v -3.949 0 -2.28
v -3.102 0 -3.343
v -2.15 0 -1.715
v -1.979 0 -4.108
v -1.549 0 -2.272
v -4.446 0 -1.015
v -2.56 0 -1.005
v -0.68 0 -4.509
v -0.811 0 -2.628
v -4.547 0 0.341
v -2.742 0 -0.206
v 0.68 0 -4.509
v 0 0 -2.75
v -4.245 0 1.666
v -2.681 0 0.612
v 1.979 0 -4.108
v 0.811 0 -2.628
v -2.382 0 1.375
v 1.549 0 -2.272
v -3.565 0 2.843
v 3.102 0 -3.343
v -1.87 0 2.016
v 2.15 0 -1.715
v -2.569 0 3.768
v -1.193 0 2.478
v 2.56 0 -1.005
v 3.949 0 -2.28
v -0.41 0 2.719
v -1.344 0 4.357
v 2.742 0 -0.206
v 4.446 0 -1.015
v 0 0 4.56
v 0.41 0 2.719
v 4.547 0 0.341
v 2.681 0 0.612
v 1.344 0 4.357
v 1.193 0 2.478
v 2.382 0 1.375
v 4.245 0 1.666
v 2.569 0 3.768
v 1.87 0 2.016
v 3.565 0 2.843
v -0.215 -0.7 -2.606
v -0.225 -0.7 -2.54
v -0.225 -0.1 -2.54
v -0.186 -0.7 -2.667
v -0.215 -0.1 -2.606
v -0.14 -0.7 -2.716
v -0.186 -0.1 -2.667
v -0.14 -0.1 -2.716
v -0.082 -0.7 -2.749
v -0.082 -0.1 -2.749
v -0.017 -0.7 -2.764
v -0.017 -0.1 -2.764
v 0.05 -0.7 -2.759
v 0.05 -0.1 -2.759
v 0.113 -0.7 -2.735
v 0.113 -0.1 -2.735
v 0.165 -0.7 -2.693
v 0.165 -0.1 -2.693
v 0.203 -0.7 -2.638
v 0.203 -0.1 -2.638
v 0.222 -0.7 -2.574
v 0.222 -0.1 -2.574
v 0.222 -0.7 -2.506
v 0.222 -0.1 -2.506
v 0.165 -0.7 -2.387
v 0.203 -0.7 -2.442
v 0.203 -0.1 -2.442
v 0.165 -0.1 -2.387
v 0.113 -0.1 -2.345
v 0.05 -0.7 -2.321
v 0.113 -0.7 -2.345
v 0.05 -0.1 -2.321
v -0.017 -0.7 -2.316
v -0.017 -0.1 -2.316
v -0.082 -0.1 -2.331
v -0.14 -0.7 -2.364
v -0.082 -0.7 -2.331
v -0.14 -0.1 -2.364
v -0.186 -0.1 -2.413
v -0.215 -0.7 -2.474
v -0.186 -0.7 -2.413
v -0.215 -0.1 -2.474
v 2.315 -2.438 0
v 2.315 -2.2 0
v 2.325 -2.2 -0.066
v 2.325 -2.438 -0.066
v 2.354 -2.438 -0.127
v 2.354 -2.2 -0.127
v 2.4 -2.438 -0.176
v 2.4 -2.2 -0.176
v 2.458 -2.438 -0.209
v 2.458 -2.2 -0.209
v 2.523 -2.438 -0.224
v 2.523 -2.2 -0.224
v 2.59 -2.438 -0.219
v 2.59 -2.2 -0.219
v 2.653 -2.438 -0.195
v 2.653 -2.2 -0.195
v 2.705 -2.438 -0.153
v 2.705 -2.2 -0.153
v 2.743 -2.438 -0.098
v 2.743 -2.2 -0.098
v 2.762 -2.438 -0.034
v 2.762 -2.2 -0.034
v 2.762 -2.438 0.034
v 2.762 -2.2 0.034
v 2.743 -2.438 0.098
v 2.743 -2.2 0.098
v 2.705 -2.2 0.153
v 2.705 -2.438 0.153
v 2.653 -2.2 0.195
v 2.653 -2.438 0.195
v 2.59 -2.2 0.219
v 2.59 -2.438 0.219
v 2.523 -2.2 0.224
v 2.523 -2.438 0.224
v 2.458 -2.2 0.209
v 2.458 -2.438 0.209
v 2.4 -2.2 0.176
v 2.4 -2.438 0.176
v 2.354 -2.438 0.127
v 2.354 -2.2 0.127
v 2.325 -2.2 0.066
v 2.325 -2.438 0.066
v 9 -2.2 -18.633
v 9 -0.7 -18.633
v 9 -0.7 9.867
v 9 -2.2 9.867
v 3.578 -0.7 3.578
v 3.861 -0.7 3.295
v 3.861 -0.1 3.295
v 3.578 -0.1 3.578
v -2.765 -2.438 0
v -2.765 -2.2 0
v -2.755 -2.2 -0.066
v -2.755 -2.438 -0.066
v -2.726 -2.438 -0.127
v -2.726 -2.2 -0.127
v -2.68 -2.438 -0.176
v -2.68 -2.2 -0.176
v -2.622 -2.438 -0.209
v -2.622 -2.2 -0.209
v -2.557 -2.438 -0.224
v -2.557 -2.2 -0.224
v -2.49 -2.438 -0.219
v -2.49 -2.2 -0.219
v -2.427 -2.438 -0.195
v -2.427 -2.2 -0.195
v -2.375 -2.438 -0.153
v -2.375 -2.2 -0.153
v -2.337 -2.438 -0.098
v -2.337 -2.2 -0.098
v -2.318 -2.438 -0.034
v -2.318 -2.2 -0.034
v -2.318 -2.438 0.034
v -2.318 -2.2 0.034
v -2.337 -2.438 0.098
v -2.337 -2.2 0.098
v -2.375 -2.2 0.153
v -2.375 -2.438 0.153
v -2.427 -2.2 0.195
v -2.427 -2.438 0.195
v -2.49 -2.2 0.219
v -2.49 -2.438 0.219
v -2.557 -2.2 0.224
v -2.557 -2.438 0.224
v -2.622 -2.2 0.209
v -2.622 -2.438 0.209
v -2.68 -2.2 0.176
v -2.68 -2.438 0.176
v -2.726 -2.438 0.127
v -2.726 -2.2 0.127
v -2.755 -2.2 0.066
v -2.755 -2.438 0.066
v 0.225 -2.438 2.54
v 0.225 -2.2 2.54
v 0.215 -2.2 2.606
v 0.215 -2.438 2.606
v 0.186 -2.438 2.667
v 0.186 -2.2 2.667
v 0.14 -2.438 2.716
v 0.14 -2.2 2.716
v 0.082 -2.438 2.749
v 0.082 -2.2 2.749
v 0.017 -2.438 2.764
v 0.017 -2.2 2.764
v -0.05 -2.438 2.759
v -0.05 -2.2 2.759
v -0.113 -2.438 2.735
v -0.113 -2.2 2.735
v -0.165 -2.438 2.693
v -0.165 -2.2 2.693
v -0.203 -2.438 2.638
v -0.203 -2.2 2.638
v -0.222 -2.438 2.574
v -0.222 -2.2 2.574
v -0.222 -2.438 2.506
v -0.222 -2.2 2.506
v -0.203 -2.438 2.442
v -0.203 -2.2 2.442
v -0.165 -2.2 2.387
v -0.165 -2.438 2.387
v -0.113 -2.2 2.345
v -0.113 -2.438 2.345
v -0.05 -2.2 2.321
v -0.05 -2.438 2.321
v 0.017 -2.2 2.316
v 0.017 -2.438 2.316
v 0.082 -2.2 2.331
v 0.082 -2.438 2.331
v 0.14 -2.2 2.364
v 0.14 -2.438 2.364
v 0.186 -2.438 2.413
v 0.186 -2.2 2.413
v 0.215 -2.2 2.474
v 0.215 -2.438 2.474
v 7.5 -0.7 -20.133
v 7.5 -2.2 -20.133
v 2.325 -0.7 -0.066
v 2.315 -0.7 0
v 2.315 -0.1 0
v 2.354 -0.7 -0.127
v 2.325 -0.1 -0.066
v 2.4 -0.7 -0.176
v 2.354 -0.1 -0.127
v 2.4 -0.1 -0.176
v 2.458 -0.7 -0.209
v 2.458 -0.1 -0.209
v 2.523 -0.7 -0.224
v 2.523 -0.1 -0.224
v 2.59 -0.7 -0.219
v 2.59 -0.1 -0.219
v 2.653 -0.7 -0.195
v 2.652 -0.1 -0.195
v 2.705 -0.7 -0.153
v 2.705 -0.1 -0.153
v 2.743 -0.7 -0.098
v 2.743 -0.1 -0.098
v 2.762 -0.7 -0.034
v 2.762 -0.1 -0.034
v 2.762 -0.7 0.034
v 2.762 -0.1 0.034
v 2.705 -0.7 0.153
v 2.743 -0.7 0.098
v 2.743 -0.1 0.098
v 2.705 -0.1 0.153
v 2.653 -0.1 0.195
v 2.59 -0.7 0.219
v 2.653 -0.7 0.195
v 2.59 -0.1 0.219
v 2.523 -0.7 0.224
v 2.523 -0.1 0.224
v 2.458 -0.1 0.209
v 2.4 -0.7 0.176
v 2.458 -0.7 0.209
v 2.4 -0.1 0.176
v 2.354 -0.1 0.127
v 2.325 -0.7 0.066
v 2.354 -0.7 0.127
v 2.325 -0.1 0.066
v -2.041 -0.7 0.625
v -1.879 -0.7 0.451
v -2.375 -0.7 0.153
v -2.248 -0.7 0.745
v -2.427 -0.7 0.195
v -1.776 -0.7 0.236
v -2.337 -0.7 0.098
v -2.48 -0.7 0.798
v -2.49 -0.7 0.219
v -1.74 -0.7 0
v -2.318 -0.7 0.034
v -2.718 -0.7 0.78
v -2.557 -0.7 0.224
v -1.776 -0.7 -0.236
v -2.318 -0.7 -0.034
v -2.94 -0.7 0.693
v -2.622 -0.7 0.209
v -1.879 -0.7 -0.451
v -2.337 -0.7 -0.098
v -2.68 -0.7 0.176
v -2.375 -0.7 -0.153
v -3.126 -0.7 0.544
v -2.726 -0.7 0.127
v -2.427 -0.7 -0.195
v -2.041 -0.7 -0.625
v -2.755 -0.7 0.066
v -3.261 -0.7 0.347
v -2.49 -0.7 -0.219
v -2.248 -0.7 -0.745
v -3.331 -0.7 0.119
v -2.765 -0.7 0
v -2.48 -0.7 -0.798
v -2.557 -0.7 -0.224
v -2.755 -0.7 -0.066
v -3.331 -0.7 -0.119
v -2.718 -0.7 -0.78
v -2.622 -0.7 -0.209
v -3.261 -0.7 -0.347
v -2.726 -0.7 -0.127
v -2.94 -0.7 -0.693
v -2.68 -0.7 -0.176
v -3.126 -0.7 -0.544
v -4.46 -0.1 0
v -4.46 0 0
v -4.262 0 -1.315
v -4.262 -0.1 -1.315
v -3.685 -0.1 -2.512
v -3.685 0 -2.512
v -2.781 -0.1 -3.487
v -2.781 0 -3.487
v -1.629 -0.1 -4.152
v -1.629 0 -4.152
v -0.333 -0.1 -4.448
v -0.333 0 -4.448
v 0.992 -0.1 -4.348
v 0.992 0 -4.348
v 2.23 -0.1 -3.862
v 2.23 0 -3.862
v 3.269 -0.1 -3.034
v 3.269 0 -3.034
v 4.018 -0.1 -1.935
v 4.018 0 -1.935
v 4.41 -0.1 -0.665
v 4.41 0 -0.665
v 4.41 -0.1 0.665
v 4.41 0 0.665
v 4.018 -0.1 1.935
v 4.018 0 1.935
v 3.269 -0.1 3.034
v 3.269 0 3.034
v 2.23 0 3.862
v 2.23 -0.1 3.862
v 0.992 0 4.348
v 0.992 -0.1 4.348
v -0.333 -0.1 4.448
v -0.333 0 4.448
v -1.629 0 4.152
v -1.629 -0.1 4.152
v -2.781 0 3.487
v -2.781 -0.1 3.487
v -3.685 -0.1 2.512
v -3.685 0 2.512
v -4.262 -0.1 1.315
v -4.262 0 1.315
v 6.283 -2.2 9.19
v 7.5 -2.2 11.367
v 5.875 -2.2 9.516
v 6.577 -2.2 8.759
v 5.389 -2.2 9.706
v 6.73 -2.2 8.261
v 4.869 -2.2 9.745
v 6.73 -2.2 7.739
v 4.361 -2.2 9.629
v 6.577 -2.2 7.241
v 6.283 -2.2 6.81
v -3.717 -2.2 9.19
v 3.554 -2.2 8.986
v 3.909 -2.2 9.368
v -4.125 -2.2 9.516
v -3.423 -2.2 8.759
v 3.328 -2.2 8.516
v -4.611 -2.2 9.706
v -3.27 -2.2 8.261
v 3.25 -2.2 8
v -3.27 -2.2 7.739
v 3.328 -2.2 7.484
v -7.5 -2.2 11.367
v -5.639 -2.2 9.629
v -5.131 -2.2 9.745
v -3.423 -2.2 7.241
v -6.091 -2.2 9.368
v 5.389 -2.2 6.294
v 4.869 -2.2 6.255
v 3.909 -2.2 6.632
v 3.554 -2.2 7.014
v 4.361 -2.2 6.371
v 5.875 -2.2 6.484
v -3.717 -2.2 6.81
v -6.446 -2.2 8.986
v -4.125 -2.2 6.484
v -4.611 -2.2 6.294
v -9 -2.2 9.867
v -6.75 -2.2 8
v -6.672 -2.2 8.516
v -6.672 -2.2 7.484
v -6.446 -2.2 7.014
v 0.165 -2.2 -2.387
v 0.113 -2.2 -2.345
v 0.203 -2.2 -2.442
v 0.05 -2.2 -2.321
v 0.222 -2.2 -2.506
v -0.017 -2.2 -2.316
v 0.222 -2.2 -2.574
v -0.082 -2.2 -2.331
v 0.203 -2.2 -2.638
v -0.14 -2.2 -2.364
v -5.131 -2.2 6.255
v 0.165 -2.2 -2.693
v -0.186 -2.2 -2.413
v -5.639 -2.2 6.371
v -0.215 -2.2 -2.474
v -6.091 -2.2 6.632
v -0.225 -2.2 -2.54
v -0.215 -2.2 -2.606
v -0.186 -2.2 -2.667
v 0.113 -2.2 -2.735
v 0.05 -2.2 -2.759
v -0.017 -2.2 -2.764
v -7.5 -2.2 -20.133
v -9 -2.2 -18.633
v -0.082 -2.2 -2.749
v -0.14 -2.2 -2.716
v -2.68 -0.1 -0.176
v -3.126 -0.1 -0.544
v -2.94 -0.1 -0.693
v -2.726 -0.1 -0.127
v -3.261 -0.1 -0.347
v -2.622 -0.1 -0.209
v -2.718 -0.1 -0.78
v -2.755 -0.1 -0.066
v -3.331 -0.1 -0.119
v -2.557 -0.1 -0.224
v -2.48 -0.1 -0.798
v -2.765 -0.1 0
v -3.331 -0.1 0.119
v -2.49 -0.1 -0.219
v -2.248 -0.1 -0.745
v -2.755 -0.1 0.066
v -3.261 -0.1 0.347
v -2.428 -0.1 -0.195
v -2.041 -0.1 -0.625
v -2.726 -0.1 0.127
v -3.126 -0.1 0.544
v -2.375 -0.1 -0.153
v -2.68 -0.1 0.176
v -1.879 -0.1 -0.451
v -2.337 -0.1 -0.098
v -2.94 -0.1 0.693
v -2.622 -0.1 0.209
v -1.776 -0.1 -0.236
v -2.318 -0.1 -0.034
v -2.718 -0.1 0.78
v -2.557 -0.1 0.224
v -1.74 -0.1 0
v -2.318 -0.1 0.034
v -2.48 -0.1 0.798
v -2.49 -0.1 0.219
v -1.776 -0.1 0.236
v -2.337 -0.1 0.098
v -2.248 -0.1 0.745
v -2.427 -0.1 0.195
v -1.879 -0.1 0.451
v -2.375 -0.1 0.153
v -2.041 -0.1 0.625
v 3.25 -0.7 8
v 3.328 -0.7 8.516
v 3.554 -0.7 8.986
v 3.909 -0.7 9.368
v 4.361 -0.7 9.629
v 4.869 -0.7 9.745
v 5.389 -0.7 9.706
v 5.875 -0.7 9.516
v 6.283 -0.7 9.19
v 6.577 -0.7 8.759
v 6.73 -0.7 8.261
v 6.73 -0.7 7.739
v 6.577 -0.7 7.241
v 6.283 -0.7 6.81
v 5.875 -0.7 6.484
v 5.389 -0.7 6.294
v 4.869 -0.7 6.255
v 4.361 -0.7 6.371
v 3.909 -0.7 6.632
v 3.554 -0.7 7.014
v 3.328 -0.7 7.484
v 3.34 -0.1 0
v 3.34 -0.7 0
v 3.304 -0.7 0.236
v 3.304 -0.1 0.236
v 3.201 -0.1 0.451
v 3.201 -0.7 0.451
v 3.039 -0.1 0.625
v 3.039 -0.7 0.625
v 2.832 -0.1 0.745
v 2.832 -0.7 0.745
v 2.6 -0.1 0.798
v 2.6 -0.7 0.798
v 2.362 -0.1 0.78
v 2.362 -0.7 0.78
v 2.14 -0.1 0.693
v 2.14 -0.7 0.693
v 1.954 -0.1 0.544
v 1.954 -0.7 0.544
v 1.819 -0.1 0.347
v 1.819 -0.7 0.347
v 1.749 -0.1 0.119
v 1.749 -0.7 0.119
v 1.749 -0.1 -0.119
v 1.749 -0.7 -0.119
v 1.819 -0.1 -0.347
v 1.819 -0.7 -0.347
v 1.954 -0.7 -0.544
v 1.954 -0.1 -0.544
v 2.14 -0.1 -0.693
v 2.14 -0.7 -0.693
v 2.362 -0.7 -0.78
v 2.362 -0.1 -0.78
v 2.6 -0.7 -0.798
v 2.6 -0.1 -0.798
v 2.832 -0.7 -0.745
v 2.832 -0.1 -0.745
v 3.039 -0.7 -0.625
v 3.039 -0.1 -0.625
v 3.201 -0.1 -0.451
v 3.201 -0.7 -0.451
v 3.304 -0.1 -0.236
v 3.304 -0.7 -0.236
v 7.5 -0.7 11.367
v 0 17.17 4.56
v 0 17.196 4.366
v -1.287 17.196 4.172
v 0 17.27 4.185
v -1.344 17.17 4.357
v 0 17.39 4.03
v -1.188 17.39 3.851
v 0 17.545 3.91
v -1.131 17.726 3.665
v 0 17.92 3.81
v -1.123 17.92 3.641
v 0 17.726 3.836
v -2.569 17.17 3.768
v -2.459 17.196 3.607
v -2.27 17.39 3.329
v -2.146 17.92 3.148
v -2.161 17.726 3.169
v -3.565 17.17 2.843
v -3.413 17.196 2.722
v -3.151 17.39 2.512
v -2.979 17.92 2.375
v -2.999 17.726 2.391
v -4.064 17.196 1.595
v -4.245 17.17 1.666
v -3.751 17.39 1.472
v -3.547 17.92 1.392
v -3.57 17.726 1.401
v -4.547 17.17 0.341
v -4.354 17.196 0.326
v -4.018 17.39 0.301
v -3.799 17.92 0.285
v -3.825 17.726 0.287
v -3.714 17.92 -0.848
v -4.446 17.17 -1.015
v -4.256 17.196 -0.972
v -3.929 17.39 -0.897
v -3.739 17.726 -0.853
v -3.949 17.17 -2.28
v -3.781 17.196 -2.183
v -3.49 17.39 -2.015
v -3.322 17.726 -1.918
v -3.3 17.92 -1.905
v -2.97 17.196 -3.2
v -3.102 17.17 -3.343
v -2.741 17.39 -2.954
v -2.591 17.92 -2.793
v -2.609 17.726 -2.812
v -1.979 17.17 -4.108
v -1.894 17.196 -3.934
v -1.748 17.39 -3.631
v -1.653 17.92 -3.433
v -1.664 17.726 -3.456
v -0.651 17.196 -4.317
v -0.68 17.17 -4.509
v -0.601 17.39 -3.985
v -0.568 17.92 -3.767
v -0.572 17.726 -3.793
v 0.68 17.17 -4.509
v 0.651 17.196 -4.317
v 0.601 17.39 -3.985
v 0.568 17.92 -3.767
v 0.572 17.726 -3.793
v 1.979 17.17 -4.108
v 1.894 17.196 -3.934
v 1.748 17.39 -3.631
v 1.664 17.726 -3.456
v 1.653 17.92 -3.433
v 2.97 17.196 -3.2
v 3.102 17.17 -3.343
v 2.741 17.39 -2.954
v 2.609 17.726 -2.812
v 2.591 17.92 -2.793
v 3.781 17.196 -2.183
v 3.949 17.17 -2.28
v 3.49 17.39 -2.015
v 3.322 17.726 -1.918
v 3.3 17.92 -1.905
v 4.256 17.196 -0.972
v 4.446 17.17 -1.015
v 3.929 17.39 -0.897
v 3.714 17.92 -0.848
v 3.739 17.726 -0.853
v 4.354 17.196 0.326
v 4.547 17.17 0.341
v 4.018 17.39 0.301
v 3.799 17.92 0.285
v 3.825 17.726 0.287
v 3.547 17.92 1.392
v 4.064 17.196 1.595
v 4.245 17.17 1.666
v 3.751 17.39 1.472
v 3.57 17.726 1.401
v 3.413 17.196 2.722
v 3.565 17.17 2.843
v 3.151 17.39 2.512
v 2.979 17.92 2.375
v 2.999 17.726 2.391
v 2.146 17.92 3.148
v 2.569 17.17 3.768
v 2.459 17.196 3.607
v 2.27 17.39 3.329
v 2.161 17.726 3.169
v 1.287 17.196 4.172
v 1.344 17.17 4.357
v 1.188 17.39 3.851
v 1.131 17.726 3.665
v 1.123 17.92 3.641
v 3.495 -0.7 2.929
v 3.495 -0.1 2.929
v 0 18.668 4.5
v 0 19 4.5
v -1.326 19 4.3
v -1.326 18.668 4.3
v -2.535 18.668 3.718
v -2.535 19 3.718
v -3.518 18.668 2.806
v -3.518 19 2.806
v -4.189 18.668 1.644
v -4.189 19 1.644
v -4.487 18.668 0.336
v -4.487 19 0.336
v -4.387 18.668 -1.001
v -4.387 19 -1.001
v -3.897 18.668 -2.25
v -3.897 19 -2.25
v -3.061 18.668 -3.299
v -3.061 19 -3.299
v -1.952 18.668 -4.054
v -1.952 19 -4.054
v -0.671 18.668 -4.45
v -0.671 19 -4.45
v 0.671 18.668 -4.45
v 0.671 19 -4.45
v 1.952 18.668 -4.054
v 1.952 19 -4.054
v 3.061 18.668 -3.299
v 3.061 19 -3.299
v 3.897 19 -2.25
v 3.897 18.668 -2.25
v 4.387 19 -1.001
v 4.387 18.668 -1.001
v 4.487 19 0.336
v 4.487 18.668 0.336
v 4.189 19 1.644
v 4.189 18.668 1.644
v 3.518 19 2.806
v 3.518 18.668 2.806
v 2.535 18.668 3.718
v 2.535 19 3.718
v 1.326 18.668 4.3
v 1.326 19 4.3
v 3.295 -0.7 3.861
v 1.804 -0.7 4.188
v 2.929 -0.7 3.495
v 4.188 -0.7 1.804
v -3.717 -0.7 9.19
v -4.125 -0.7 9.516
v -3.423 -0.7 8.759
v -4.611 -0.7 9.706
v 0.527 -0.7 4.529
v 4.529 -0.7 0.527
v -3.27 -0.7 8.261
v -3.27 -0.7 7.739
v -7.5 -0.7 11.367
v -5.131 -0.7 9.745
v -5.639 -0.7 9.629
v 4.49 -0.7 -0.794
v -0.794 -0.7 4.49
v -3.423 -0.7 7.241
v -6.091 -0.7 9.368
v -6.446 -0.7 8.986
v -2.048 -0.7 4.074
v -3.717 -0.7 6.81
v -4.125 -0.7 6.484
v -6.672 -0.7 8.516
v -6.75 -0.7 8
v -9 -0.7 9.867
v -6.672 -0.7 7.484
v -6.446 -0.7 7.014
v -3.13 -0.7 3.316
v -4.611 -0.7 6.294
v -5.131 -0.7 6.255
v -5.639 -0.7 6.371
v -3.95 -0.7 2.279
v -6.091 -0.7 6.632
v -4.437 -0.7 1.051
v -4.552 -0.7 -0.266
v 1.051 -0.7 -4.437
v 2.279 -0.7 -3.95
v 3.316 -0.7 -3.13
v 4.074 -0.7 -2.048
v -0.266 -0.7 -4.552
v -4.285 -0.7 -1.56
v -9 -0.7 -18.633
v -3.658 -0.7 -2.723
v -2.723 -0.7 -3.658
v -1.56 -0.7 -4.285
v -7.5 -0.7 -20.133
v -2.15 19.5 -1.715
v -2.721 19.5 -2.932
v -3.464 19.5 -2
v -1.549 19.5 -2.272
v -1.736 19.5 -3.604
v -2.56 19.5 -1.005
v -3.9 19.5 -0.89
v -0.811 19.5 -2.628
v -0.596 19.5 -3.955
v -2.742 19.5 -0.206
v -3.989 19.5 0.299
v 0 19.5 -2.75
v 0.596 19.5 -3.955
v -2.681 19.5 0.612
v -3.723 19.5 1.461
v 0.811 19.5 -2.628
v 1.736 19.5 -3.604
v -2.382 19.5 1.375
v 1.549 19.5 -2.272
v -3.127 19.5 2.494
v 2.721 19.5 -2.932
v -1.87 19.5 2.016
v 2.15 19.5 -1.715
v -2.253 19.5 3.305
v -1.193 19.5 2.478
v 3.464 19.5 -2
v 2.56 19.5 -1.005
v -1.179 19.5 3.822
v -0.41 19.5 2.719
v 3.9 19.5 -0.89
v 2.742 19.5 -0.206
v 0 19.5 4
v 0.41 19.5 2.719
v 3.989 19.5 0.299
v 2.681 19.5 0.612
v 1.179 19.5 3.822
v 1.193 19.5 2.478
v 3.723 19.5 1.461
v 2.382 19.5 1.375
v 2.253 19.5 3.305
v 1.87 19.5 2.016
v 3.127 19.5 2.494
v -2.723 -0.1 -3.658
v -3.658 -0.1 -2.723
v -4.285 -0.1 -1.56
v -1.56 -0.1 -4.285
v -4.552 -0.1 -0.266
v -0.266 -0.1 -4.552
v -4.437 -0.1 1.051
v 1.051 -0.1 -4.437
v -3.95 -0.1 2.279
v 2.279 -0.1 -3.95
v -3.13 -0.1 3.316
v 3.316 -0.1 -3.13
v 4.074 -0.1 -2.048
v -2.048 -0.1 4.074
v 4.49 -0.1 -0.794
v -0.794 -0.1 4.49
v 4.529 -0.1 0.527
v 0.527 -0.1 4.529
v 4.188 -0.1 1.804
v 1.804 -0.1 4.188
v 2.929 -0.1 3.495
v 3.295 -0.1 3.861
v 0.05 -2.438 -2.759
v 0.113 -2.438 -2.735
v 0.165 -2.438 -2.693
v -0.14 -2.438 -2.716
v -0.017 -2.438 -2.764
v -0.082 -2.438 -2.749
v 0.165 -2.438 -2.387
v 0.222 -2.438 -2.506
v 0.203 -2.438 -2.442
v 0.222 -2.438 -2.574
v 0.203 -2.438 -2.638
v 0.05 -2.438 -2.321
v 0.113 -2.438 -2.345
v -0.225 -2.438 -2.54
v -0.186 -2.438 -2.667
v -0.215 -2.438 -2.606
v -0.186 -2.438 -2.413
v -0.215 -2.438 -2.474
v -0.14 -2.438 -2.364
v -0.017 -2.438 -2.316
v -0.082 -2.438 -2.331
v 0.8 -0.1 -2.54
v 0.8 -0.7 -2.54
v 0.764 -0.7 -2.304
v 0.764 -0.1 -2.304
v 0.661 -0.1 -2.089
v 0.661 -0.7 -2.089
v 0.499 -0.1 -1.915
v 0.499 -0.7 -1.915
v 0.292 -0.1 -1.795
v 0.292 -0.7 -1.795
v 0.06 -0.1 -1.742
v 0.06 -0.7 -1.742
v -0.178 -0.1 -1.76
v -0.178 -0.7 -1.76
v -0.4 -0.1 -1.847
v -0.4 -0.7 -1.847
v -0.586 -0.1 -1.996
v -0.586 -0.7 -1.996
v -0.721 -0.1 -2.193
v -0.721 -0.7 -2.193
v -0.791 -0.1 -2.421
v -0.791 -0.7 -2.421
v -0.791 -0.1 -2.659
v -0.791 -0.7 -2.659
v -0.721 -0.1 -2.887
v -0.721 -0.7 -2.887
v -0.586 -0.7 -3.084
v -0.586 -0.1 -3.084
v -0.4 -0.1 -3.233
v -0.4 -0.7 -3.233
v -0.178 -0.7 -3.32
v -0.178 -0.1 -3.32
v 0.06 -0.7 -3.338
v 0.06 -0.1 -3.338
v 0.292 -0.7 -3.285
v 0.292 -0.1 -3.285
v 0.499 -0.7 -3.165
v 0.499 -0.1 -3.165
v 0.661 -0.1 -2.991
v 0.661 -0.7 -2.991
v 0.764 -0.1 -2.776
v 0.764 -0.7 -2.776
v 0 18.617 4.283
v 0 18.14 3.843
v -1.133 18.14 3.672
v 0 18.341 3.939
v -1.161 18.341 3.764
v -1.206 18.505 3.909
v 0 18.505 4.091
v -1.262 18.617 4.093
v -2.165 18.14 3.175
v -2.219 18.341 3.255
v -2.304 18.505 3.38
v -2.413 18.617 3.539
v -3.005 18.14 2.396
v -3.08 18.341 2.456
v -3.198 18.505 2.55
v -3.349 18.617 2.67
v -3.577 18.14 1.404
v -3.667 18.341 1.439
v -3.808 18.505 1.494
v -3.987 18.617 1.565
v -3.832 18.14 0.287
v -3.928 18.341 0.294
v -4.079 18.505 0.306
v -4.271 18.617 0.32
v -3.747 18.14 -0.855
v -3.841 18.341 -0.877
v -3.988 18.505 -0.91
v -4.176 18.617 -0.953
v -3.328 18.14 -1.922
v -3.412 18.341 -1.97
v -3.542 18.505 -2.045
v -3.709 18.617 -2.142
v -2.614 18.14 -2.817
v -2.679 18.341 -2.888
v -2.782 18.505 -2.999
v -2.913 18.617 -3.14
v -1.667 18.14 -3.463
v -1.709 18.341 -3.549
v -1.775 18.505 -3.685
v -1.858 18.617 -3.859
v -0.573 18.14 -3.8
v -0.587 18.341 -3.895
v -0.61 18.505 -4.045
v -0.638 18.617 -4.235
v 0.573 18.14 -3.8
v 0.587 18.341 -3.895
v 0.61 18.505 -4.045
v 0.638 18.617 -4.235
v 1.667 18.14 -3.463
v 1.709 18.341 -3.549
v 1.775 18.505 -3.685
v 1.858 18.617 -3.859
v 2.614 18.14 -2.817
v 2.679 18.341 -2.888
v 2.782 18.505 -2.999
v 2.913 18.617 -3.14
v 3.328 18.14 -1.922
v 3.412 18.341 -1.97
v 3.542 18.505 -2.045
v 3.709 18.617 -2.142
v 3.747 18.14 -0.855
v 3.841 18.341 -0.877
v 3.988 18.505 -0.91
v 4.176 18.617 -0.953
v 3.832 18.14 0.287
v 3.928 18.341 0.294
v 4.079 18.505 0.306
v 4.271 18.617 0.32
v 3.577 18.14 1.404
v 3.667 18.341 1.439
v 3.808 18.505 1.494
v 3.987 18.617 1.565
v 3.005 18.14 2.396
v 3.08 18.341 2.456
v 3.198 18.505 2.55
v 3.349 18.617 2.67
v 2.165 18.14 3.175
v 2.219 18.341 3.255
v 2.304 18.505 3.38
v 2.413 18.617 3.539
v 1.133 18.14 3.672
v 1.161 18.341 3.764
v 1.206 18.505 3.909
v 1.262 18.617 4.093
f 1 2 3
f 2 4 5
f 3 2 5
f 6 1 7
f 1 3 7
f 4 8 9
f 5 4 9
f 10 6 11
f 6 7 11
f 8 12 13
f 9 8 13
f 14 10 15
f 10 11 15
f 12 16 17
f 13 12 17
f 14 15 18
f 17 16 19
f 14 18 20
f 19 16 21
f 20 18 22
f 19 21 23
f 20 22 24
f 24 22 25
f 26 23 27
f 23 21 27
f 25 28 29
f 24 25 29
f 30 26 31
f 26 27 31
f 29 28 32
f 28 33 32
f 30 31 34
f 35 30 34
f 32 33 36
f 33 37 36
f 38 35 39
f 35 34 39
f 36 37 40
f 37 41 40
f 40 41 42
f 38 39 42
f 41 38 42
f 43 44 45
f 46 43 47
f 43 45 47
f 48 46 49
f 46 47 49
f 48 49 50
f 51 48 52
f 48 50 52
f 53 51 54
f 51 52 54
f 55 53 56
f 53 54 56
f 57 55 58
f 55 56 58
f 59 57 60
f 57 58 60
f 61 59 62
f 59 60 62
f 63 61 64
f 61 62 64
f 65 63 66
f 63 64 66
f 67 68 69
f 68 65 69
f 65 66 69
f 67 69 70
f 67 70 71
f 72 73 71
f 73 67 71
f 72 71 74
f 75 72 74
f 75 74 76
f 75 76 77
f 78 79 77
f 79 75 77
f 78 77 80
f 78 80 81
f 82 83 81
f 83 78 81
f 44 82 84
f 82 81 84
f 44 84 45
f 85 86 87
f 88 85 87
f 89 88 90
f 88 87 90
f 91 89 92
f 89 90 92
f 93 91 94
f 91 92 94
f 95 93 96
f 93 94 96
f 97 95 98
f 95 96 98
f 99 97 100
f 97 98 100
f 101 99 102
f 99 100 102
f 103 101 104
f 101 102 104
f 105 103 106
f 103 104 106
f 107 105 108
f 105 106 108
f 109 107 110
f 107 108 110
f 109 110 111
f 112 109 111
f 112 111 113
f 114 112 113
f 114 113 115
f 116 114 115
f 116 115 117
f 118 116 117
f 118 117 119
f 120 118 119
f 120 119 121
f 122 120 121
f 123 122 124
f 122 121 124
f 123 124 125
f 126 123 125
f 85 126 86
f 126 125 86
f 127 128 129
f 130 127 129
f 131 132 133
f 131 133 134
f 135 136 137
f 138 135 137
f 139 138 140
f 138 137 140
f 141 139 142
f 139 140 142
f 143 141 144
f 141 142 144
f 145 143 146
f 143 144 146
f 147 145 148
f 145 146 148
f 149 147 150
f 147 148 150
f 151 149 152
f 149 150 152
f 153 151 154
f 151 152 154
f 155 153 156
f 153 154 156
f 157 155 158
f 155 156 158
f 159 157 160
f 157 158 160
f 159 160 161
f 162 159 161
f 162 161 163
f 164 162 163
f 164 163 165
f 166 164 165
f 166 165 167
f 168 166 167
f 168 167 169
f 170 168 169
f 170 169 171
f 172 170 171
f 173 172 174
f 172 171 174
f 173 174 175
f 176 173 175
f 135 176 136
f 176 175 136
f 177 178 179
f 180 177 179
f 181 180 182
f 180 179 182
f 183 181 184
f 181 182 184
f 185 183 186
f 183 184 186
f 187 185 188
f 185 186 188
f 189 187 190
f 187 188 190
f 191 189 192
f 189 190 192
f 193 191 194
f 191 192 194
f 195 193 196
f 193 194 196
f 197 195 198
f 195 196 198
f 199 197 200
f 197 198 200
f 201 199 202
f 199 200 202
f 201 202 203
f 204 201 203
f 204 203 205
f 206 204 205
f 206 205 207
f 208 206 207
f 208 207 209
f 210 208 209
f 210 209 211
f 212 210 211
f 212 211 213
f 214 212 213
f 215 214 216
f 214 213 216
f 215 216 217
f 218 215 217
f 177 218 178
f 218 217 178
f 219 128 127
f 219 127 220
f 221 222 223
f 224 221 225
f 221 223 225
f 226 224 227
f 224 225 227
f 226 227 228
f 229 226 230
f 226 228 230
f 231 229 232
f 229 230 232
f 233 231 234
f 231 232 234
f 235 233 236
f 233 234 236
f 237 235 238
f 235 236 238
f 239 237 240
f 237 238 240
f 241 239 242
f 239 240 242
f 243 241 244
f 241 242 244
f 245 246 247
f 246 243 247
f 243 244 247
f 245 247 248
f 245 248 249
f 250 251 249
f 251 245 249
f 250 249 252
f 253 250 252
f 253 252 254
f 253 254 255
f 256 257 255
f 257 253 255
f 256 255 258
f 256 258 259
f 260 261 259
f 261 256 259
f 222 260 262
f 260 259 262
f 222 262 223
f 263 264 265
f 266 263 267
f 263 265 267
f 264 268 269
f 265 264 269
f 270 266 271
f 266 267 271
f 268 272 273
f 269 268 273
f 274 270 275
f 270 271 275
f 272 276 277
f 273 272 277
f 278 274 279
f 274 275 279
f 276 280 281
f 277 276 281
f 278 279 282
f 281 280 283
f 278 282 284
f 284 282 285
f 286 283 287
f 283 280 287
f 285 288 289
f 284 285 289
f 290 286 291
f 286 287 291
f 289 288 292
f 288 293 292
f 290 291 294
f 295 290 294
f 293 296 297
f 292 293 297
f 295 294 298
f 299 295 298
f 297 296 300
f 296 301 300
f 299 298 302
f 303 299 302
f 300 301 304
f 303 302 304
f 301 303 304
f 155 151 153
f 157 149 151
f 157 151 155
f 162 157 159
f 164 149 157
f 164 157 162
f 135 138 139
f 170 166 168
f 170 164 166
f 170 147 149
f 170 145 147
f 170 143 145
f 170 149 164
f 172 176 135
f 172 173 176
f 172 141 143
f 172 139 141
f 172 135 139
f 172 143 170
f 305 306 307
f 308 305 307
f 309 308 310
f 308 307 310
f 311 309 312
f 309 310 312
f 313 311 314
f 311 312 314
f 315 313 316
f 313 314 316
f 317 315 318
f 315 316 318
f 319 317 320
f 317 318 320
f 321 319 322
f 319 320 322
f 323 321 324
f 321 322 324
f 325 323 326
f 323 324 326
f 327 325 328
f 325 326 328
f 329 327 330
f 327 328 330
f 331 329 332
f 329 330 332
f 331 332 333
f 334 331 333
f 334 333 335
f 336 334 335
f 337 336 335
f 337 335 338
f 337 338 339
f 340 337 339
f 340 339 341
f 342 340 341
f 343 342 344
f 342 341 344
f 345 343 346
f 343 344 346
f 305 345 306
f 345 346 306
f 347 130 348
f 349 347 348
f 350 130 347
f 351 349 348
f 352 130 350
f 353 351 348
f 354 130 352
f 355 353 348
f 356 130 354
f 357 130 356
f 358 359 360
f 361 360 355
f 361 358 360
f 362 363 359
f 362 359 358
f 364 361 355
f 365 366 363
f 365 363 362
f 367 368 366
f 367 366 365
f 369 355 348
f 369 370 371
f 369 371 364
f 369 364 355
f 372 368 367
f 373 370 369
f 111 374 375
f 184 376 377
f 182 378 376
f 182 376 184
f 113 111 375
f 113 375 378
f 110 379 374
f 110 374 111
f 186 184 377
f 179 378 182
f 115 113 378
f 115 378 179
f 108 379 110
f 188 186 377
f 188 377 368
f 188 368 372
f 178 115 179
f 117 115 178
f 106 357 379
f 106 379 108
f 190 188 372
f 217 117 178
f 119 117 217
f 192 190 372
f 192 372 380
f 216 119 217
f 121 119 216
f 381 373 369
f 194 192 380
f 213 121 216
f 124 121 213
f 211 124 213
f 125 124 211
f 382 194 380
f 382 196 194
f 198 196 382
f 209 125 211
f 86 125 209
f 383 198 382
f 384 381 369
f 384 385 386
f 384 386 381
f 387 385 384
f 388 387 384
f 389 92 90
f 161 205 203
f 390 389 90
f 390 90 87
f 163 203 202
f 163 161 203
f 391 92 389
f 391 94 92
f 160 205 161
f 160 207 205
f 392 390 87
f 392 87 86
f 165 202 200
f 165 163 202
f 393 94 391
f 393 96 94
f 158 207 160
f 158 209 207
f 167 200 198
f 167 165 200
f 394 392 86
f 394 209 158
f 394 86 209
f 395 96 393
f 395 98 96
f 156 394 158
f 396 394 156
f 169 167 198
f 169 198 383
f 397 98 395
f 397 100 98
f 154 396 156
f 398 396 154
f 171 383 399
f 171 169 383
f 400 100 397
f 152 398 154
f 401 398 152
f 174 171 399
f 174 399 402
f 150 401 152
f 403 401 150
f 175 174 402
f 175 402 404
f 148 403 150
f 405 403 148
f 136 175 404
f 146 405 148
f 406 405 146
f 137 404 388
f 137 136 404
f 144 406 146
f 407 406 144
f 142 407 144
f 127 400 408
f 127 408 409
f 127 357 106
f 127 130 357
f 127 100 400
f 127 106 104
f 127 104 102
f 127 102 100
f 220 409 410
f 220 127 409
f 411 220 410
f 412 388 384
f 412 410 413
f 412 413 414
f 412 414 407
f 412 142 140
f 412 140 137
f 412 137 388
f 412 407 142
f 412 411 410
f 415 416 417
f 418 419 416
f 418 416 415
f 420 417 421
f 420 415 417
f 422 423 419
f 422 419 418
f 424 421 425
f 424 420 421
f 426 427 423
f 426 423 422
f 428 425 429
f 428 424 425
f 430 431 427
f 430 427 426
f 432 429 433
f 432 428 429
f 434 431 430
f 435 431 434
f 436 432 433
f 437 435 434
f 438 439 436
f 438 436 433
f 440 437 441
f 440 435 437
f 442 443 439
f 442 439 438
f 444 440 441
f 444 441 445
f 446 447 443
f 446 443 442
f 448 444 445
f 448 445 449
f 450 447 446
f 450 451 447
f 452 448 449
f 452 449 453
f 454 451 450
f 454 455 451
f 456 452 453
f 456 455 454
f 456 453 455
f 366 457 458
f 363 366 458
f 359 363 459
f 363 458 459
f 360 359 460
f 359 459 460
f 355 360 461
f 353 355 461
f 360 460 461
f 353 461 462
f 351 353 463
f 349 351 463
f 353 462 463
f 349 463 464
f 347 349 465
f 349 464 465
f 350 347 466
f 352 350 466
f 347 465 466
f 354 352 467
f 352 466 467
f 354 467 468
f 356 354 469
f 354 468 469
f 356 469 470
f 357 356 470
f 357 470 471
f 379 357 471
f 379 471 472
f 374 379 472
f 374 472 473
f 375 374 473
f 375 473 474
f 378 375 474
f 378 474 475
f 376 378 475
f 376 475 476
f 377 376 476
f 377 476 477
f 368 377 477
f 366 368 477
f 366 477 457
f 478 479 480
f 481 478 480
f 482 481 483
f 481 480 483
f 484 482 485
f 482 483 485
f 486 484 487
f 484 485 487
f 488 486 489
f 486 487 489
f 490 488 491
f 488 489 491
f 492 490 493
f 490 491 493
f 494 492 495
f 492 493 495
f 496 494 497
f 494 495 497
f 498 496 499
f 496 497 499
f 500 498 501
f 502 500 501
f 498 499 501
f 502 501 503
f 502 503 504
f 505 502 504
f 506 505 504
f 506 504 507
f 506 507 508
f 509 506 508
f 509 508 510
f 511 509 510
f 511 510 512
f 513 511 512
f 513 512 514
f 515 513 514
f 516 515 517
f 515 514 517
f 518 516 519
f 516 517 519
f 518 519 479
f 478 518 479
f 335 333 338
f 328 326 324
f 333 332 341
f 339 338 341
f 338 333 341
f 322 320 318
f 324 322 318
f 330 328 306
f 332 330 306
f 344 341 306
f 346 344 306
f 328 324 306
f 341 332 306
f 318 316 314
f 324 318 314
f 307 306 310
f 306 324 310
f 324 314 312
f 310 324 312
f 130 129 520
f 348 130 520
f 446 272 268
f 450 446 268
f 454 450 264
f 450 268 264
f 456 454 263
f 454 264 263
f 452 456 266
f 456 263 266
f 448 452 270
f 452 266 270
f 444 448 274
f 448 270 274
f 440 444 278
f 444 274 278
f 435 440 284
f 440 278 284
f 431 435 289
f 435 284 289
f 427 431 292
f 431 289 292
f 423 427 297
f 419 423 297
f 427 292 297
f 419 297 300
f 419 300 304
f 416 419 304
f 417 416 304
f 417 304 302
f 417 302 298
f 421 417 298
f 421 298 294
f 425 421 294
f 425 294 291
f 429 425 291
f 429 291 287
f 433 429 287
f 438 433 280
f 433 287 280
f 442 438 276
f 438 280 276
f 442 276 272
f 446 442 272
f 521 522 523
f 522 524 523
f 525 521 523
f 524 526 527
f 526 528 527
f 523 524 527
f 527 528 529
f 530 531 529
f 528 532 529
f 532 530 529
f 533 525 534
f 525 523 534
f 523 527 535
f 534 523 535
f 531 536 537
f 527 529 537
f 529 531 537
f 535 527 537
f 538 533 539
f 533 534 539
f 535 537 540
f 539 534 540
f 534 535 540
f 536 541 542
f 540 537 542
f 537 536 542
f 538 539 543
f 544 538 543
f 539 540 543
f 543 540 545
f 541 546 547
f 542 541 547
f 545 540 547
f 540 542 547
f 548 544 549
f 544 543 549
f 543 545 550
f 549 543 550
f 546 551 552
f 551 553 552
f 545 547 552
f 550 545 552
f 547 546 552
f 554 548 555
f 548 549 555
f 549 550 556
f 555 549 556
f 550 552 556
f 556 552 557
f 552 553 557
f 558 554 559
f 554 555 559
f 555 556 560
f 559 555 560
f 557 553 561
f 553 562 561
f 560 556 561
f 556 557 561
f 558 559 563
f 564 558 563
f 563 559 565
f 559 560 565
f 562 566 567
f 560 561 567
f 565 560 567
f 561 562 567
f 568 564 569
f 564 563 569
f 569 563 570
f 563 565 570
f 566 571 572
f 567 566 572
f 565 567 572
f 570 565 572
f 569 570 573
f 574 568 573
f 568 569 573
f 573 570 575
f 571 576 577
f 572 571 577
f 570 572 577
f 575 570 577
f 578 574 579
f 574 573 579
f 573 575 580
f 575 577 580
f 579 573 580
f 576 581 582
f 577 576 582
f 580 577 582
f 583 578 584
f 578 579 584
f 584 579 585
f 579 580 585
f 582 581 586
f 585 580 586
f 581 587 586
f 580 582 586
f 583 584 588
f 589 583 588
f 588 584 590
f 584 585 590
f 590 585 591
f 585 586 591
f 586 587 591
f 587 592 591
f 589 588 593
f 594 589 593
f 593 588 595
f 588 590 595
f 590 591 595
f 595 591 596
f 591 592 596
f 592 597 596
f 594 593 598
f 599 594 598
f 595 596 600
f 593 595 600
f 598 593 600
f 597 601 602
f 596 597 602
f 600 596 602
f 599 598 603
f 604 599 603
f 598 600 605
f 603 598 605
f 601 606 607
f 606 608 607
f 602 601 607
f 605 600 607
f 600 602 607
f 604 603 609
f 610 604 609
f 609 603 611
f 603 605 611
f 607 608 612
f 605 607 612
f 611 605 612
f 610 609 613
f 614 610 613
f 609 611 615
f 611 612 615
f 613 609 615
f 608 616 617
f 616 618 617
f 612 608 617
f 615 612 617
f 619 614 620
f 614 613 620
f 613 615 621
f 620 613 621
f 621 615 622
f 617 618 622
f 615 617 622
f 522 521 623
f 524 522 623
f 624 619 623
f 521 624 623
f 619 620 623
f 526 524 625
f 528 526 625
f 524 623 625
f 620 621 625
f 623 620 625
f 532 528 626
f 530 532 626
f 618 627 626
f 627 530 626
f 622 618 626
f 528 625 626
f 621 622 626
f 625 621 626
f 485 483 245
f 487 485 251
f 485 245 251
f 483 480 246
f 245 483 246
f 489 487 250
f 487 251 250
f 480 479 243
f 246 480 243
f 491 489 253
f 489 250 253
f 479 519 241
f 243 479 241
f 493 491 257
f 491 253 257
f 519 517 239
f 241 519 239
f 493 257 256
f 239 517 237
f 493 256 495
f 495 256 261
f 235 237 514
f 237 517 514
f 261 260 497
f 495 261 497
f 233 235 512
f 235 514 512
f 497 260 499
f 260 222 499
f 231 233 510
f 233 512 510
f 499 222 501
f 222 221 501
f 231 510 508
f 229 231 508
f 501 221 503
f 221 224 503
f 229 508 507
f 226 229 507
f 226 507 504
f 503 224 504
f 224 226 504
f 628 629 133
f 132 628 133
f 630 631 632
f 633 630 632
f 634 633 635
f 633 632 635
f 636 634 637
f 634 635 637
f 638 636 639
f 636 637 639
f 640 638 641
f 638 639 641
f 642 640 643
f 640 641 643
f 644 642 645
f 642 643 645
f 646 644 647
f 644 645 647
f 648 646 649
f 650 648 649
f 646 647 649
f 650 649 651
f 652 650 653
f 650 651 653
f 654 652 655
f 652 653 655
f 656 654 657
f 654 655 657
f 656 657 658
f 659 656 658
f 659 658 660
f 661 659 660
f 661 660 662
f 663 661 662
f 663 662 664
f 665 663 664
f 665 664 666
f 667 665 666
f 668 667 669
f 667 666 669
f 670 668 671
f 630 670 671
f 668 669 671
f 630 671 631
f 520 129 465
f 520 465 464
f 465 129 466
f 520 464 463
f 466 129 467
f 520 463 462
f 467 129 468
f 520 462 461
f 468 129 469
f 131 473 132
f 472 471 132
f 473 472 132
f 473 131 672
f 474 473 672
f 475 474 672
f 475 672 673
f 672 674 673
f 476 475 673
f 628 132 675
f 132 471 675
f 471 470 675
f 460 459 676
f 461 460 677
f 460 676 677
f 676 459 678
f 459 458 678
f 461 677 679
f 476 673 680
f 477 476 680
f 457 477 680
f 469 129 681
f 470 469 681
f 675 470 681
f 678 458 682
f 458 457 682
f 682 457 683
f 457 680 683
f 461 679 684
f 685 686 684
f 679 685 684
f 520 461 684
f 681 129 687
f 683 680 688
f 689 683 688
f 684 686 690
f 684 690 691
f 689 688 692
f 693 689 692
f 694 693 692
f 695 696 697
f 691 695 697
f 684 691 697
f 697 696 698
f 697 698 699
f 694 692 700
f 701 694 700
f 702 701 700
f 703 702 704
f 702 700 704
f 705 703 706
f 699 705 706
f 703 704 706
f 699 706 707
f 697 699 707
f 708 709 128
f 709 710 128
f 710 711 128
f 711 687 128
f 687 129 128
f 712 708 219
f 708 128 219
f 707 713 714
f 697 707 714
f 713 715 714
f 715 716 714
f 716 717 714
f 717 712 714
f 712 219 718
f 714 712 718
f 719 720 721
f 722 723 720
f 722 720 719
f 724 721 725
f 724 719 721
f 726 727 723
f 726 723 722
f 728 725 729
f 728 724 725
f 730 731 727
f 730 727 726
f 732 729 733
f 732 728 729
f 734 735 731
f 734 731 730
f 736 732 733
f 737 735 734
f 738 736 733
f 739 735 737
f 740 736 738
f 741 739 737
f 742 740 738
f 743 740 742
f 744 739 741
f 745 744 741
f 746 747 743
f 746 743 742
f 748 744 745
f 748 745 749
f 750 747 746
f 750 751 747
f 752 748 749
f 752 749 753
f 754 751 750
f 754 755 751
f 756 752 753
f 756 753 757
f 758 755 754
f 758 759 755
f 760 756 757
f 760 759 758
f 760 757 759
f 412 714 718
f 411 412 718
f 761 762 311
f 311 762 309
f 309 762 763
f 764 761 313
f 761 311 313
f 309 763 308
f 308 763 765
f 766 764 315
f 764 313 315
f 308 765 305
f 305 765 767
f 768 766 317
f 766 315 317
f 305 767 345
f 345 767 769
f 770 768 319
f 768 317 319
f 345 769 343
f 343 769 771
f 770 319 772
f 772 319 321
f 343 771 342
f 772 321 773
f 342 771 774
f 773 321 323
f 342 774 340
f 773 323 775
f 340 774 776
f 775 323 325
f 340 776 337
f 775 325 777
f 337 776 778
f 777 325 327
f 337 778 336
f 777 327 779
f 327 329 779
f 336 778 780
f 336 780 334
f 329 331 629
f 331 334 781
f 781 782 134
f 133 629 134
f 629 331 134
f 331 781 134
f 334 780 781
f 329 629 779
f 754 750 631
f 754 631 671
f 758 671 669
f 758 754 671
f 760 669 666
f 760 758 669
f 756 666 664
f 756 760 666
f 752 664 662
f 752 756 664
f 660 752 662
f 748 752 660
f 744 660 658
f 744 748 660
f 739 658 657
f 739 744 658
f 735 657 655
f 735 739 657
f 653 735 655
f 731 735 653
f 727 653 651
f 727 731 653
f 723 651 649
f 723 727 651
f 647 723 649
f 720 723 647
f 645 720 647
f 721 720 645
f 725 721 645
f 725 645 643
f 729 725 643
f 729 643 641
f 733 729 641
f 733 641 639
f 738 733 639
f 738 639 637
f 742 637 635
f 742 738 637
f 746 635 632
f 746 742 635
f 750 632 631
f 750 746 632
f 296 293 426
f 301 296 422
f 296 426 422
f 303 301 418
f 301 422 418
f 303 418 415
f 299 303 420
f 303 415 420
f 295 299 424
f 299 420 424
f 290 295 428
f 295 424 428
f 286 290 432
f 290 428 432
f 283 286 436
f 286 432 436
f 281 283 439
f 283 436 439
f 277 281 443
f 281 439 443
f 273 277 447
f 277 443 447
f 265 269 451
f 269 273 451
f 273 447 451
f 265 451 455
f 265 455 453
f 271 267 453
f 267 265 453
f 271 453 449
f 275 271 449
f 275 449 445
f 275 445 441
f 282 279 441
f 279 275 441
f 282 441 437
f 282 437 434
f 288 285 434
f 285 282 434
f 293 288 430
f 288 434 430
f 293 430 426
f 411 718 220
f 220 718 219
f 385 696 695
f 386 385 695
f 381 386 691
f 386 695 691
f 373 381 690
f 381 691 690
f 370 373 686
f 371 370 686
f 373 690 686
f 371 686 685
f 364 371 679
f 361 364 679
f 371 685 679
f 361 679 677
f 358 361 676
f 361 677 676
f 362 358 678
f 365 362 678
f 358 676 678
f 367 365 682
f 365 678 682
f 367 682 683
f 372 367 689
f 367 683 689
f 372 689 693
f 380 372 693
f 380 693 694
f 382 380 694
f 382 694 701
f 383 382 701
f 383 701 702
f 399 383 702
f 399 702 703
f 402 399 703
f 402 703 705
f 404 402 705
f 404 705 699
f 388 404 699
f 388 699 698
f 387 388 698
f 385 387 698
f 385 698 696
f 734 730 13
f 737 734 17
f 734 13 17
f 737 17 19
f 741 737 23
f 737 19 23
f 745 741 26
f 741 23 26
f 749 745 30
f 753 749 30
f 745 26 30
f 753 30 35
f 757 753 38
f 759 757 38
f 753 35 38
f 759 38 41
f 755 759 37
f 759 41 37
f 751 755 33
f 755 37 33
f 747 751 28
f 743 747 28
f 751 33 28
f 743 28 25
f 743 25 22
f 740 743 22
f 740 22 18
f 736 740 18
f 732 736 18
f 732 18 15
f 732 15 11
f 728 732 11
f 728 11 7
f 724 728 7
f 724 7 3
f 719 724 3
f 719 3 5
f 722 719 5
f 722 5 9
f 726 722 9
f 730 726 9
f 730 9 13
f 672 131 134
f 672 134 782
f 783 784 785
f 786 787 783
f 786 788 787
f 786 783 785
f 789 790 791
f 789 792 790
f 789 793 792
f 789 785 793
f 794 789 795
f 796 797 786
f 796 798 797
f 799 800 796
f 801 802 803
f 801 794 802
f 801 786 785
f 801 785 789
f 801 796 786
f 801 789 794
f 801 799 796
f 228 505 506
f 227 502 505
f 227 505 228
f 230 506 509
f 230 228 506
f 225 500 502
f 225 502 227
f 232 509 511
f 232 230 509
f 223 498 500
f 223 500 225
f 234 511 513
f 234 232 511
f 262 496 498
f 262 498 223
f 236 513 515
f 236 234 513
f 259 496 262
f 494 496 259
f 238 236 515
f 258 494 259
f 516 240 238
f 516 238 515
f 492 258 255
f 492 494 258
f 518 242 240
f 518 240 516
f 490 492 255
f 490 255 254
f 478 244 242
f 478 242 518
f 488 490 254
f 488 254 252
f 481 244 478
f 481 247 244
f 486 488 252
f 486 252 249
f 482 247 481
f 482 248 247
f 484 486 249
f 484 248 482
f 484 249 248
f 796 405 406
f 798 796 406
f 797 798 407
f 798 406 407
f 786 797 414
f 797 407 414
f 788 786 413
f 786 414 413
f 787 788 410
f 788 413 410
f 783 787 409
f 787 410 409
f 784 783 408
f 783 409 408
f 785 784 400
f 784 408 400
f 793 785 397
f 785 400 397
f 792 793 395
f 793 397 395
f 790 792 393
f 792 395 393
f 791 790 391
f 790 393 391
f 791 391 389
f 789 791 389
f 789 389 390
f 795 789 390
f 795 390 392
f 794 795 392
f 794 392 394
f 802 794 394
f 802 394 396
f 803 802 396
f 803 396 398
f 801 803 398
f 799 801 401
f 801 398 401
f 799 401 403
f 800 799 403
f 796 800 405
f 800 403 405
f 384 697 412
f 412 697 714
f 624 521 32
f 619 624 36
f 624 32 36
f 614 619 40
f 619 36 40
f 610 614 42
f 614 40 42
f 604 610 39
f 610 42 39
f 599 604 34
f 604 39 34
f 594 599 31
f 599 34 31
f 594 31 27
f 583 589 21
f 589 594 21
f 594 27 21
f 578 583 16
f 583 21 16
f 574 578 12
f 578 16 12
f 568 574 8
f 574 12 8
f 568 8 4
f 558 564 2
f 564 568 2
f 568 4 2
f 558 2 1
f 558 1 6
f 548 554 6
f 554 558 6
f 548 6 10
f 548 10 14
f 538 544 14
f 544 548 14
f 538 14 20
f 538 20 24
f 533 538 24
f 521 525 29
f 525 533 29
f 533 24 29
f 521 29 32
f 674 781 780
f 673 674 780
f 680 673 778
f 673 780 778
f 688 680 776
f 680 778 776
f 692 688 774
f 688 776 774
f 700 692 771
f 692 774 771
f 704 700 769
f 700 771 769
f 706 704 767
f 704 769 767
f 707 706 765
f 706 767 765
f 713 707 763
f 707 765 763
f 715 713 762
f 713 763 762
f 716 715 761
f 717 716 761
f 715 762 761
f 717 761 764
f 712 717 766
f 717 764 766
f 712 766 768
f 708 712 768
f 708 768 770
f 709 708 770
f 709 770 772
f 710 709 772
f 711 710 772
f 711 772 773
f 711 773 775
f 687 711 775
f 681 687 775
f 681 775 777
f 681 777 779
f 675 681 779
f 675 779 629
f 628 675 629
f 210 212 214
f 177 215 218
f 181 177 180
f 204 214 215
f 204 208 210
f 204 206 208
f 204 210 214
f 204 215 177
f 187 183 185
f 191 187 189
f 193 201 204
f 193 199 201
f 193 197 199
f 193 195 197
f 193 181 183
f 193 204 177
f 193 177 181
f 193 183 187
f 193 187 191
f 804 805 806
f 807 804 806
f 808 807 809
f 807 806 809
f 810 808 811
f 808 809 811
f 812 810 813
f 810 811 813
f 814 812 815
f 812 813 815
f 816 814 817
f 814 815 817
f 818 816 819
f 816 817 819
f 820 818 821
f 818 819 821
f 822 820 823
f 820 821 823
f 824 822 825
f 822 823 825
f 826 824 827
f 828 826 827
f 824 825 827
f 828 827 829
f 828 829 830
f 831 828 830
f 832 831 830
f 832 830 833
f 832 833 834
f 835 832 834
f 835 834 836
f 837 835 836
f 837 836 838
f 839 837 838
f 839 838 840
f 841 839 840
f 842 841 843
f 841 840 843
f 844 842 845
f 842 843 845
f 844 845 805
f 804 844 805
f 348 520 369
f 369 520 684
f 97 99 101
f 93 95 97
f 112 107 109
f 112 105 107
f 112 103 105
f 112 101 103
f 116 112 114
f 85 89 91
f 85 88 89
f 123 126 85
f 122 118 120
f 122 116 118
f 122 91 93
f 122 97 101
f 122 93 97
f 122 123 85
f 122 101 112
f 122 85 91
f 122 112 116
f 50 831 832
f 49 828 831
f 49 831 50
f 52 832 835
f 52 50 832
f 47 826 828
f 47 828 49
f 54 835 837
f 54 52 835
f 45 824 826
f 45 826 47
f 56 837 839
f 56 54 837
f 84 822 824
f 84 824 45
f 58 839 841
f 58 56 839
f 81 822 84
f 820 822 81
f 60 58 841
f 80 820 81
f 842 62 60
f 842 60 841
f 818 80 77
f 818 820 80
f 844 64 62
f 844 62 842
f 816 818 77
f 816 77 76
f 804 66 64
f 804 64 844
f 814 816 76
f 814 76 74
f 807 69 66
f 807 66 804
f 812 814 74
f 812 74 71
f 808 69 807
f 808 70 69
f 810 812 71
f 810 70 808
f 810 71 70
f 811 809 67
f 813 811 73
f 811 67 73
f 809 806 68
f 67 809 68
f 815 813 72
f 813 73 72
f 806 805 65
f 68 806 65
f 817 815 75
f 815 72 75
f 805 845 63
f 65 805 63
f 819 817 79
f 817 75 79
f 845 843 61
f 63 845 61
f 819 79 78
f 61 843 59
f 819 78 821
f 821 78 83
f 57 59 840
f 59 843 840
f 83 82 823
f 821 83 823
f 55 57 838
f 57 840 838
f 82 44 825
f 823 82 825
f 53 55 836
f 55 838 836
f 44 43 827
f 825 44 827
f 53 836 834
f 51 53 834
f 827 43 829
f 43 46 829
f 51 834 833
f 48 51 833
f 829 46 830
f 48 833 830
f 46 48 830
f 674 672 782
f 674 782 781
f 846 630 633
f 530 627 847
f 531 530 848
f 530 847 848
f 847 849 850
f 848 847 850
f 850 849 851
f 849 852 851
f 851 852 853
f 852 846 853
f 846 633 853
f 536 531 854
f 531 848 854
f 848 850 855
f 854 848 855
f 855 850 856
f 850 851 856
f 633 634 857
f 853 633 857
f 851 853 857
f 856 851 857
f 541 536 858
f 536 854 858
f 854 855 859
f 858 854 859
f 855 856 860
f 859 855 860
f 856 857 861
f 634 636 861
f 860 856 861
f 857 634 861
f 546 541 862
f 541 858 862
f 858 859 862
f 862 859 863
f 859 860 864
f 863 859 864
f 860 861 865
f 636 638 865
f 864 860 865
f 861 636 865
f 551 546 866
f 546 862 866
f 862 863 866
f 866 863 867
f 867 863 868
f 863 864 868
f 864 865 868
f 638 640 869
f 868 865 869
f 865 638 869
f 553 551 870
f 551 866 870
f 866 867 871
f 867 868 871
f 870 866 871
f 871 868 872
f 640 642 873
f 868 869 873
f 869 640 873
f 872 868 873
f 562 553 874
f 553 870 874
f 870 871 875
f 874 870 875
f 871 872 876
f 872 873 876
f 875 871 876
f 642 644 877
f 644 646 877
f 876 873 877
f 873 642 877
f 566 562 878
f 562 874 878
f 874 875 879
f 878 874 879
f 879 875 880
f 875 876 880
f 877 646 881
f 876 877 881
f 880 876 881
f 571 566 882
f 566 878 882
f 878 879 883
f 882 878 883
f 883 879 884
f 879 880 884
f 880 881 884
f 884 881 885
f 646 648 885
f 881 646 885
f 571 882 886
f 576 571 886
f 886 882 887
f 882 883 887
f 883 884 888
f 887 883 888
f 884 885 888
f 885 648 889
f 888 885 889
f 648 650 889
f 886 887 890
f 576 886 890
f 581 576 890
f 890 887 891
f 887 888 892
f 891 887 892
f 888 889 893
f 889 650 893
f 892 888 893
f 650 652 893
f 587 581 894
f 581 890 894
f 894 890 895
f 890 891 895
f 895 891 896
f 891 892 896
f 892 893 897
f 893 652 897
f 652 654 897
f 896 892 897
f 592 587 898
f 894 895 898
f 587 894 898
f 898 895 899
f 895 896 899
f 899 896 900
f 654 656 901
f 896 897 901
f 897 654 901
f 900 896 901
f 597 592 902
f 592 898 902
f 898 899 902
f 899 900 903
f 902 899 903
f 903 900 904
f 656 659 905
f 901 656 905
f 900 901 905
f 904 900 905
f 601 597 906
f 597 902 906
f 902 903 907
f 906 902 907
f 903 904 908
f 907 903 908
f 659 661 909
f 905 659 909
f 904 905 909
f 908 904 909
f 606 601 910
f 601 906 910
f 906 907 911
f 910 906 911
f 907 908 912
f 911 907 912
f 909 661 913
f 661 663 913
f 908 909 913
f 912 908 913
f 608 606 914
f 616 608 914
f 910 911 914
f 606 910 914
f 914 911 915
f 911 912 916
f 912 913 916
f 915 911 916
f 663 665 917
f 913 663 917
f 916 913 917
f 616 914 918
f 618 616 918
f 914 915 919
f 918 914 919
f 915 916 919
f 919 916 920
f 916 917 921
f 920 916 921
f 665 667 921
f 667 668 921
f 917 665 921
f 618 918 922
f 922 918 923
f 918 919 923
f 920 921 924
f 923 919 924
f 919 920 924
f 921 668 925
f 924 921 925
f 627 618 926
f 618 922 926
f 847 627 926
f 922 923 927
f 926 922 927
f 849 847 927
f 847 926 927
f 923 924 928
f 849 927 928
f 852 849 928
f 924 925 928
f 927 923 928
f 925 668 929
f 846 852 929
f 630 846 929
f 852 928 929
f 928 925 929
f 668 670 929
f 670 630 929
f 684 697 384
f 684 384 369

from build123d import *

# Parameters (mm, degrees)
SCHIZZO1_R                   = 4.56
ESTRUSIONE_ESTRUSIONE1_DEPTH = 19.5
SCHIZZO2_R                   = 0.75
SCHIZZO3_W                   = 2.392896604
SCHIZZO3_H                   = 1.50856525
SMUSSO1_SIZE                 = 0.5
FORO_PER_VITE_M5_1_D         = 5.5
ESTRUSIONE_ESTRUSIONE2_DEPTH = 0.6
SCHIZZO9_R                   = 0.8
TAGLIO_ESTRUSIONE1_DEPTH     = 0.6
SCHIZZO10_R                  = 0.225
ESTRUSIONE_ESTRUSIONE3_DEPTH = 13
Y_KSEKLIK_EKSTR_ZYON1_DEPTH  = 1.5
IZIM2_W                      = 6.442829969
IZIM2_H                      = 10.895192142
KES_EKSTR_ZYON1_DEPTH        = 13.5
IZIM3_R                      = 1.75
KES_EKSTR_ZYON2_DEPTH        = 13.5
KES_EKSTR_ZYON3_DEPTH        = 13.5


with BuildPart() as part:
    # Schizzo1 → Estrusione-Estrusione1 (new body)
    with BuildSketch(Plane(origin=(0, 0, 0), x_dir=(1, 0, 0), z_dir=(0, 1, 0))):
        with Locations(Location((0, 0, 0), (0, 0, 270))):
            Circle(SCHIZZO1_R)
    extrude(amount=ESTRUSIONE_ESTRUSIONE1_DEPTH)

    # Schizzo2 → Taglia-Rivoluzione1 (revolve, cut)
    with BuildSketch(Plane.XY, mode=Mode.PRIVATE) as taglia_rivoluzione1_sk:
        with Locations((-4.56, 17.92)):
            Circle(SCHIZZO2_R)
    revolve(taglia_rivoluzione1_sk.sketch.rotate(Axis((0, 19.5, 0), (0, -1, 0)), 270), axis=Axis((0, 19.5, 0), (0, -1, 0)), mode=Mode.SUBTRACT)

    # Schizzo3 → Taglia-Rivoluzione2 (revolve, cut)
    with BuildSketch(Plane.XY, mode=Mode.PRIVATE) as taglia_rivoluzione2_sk:
        with Locations((-5.696448302, 18.983195512)):
            Rectangle(SCHIZZO3_W, SCHIZZO3_H)
    revolve(taglia_rivoluzione2_sk.sketch.rotate(Axis((0, 19.5, 0), (0, -1, 0)), 270), axis=Axis((0, 19.5, 0), (0, -1, 0)), mode=Mode.SUBTRACT)

    # Smusso1
    smusso1_edges = [part.edges().sort_by_distance(p)[0] for p in [
        (0, 19.5, -4.5),
    ]]
    chamfer(smusso1_edges, length=SMUSSO1_SIZE)

    # Foro per Vite M5-1 (through all)
    with Locations(Plane.ZX.offset(19.5)):
        with Locations((0, 0)):
            Hole(FORO_PER_VITE_M5_1_D / 2)


with BuildPart() as body_2:
    # Schizzo7 → Rivoluzione1 (revolve)
    with BuildSketch(Plane.XY):
        Polygon((0, 0), (0, -0.7), (-4.56, -0.7), (-4.56, -0.1), (-4.46, -0.1), (-4.46, 0), align=None)
    revolve(axis=Axis((0, 0, 0), (0, -1, 0)))

    # Schizzo8 → Estrusione-Estrusione2 (add)
    with BuildSketch(Plane.XZ.offset(0.7)):
        Polygon((0.282842712, -0.282842712), (3.860803025, 3.2951176), (3.577960313, 3.577960313), (3.2951176, 3.860803025), (-0.282842712, 0.282842712), align=None)
    extrude(amount=-ESTRUSIONE_ESTRUSIONE2_DEPTH)

    # Schizzo9 → Taglio-Estrusione1 (cut)
    with BuildSketch(Plane.XZ.offset(0.7)):
        with Locations((2.54, 0)):
            Circle(SCHIZZO9_R)
        with Locations((0, -2.54)):
            Circle(SCHIZZO9_R)
        with Locations((-2.54, 0)):
            Circle(SCHIZZO9_R)
    extrude(amount=-TAGLIO_ESTRUSIONE1_DEPTH, mode=Mode.SUBTRACT)

    # Schizzo10 → Estrusione-Estrusione3 (add)
    with BuildSketch(Plane.XZ.offset(0.1)):
        with Locations((0, 2.54)):
            Circle(SCHIZZO10_R)
        with Locations(Location((2.54, 0, 0), (0, 0, 180))):
            Circle(SCHIZZO10_R)
        with Locations(Location((0, -2.54, 0), (0, 0, 180))):
            Circle(SCHIZZO10_R)
        with Locations(Location((-2.54, 0, 0), (0, 0, 180))):
            Circle(SCHIZZO10_R)
    extrude(amount=ESTRUSIONE_ESTRUSIONE3_DEPTH)

    # Çizim1 → Yükseklik-Ekstrüzyon1 (add)
    with BuildSketch(Plane(origin=(0, -0.7, 0), x_dir=(-1, 0, 0), z_dir=(0, -1, 0))):
        Polygon((-9, 11.367115911), (-9, -11.367115911), (9, -11.367115911), (9, 14.722710851), (9, 20.132884089), (-9, 20.132884089), align=None)
    extrude(amount=Y_KSEKLIK_EKSTR_ZYON1_DEPTH)

    # Çizim2 → Kes-Ekstrüzyon1 (cut)
    with BuildSketch(Plane.ZY.offset(9)):
        with Locations((0.288139048, -7.885150624)):
            Rectangle(IZIM2_W, IZIM2_H)
    extrude(amount=-KES_EKSTR_ZYON1_DEPTH, mode=Mode.SUBTRACT)

    # Çizim3 → Kes-Ekstrüzyon2 (cut)
    with BuildSketch(Plane(origin=(0, -0.7, 0), x_dir=(1, 0, 0), z_dir=(0, 1, 0))):
        with Locations(Location((-5, -8, 0), (0, 0, 180))):
            Circle(IZIM3_R)
        with Locations(Location((5, -8, 0), (0, 0, 180))):
            Circle(IZIM3_R)
    extrude(amount=-KES_EKSTR_ZYON2_DEPTH, mode=Mode.SUBTRACT)

    # Çizim4 → Kes-Ekstrüzyon3 (cut)
    with BuildSketch(Plane(origin=(0, -0.7, 0), x_dir=(1, 0, 0), z_dir=(0, 1, 0))):
        Polygon((-9, -9.867115911), (-7.5, -11.367115911), (-9, -11.367115911), align=None)
        Polygon((9, -11.367115911), (9, -9.867115911), (7.5, -11.367115911), align=None)
        Polygon((9, 18.632884089), (7.5, 20.132884089), (9, 20.132884089), align=None)
        Polygon((-9, 20.132884089), (-9, 18.632884089), (-7.5, 20.132884089), align=None)
    extrude(amount=-KES_EKSTR_ZYON3_DEPTH, mode=Mode.SUBTRACT)


solid = Compound([part.part, body_2.part])
